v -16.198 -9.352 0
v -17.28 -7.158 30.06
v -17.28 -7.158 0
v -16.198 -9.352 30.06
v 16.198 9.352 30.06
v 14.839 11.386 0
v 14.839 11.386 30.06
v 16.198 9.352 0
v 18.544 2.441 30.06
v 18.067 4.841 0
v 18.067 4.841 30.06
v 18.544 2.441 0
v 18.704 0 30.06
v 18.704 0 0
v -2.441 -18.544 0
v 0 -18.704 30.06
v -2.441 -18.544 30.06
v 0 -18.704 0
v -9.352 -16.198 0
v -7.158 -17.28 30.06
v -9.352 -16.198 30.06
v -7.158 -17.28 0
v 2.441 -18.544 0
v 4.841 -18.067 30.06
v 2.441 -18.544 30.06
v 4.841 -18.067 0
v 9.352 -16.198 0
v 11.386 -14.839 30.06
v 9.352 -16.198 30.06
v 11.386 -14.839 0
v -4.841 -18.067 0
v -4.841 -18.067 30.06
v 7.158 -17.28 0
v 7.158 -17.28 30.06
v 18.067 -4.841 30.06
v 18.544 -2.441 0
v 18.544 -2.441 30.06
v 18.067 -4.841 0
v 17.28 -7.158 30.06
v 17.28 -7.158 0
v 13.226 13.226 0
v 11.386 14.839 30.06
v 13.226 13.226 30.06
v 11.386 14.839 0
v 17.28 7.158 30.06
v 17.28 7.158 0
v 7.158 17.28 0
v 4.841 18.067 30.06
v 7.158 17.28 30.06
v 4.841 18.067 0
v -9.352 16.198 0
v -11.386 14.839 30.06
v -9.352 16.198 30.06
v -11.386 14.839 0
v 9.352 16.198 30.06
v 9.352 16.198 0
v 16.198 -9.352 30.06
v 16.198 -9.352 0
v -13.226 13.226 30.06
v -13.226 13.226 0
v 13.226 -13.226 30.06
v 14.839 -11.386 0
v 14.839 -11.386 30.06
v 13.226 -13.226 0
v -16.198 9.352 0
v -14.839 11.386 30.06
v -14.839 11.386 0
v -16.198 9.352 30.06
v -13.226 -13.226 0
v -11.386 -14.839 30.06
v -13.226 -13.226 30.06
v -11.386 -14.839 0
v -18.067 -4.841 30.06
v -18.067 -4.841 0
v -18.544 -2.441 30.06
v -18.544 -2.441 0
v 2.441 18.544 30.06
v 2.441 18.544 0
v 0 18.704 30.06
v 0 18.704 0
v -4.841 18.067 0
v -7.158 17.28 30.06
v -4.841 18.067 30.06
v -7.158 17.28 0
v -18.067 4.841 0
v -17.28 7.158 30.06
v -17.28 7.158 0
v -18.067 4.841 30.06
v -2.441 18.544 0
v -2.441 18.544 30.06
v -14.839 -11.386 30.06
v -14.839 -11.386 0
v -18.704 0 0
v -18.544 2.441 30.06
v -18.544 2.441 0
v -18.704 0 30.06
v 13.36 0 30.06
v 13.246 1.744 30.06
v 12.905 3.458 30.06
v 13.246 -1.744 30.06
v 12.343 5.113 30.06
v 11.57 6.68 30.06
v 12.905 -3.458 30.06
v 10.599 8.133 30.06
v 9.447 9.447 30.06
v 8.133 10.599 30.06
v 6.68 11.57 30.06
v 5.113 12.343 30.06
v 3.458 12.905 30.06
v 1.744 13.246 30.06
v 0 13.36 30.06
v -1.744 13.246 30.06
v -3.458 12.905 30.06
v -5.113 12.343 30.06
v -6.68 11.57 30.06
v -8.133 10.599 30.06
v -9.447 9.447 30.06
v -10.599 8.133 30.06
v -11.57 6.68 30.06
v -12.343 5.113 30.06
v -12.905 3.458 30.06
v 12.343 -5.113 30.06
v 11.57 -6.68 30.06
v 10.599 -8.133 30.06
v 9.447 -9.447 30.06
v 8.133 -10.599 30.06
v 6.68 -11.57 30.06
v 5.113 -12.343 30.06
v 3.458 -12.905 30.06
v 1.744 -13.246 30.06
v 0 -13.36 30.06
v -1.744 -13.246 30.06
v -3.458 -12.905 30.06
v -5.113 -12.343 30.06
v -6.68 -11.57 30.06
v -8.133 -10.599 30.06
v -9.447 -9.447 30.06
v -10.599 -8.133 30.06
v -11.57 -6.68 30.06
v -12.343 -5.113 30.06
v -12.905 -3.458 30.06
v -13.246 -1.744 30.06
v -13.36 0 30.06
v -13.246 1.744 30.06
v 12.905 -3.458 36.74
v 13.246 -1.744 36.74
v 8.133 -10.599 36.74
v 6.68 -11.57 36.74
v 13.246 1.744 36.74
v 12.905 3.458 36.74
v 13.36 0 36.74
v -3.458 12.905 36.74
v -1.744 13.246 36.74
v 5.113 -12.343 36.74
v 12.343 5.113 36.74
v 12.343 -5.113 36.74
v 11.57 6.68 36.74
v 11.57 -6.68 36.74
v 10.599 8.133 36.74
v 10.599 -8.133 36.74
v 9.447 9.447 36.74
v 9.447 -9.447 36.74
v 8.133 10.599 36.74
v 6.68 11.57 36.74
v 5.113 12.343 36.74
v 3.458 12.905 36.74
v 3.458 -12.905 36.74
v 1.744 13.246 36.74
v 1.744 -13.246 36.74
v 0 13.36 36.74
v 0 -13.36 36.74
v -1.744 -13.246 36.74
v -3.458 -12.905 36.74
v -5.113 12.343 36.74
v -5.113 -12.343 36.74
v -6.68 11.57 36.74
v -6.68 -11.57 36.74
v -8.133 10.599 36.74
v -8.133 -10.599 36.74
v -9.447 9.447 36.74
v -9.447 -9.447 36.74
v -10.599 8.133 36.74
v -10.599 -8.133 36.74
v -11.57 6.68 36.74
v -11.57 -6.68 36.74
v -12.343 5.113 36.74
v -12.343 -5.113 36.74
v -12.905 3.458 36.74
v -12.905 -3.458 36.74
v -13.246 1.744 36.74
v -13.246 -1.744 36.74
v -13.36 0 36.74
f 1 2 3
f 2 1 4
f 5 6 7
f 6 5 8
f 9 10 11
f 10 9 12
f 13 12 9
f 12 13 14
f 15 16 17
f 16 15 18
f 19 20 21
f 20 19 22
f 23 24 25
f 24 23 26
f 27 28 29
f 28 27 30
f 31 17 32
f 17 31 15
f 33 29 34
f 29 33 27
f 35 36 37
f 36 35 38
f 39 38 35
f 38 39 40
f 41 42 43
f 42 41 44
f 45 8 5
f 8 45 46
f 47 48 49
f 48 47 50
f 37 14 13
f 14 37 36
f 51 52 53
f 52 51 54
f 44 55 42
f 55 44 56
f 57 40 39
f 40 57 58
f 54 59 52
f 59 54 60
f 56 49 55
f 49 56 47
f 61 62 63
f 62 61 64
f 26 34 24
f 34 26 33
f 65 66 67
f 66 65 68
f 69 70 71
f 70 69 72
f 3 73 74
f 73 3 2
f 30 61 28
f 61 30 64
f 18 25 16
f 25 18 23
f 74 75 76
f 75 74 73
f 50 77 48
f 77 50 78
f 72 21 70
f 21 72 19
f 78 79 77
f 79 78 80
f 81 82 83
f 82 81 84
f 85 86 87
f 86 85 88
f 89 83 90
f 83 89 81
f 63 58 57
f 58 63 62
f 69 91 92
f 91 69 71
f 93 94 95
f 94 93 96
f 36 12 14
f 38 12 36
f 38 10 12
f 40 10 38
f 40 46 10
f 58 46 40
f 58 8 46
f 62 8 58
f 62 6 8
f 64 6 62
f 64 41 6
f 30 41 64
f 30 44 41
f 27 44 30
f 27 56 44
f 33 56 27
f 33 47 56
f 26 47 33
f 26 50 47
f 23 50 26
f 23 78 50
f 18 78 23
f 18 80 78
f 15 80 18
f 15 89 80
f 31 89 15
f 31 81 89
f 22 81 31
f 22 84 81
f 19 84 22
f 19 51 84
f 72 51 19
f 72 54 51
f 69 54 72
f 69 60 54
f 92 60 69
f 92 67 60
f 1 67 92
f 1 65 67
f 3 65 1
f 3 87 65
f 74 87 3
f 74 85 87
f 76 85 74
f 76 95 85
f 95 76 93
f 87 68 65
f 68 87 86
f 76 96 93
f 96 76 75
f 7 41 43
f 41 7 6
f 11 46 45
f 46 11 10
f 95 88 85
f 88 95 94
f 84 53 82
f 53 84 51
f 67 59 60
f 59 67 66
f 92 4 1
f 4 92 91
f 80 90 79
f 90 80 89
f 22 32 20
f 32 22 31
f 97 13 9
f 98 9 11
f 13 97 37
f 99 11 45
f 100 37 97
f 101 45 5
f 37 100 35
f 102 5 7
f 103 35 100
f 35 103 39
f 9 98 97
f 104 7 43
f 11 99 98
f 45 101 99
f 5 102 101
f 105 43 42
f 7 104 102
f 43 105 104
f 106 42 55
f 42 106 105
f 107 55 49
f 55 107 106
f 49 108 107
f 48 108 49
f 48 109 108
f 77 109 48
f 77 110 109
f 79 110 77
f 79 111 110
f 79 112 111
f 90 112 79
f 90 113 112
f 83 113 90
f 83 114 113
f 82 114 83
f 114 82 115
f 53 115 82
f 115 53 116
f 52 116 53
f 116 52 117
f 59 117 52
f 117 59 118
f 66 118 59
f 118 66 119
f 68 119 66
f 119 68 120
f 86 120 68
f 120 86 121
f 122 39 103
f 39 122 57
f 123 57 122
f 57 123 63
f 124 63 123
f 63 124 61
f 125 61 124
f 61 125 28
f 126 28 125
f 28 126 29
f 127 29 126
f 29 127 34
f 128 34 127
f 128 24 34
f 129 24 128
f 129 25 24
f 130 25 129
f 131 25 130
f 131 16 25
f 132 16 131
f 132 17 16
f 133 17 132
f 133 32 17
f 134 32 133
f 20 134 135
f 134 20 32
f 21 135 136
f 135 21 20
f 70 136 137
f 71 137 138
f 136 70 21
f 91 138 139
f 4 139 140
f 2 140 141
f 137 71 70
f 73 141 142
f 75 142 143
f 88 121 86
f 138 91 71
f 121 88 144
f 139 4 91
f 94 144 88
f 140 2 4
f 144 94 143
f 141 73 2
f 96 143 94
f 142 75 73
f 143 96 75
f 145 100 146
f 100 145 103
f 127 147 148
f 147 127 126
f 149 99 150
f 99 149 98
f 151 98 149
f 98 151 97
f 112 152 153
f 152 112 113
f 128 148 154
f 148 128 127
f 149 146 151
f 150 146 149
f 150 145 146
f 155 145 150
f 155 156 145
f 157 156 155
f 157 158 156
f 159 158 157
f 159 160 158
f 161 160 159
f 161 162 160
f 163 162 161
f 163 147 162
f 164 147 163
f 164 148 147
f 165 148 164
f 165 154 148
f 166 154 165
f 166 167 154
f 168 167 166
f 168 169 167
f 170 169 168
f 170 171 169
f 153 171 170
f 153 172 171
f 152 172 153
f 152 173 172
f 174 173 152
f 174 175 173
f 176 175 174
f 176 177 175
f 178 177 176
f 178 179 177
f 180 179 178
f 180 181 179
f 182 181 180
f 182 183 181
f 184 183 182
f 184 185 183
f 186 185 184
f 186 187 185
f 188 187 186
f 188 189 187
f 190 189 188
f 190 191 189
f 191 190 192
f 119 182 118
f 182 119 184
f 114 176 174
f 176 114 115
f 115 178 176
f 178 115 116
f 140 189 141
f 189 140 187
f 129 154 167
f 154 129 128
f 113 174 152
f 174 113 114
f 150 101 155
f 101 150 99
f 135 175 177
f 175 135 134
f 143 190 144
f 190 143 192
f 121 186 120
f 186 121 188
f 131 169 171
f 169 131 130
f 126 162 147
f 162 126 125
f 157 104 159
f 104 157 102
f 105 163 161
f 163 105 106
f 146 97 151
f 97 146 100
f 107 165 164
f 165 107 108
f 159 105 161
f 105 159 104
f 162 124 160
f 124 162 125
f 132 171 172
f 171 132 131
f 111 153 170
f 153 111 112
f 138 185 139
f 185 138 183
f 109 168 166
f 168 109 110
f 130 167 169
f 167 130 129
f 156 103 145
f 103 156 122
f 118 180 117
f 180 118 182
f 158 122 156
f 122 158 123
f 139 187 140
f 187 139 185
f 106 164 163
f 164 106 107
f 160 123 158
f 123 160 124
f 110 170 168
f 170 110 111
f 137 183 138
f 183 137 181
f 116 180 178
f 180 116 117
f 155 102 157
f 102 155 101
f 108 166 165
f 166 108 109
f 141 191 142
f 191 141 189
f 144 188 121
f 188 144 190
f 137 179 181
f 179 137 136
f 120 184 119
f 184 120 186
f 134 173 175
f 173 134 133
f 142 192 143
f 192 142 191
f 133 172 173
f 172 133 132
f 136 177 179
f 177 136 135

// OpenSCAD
// Auto-generated by scripts/author_from_manifest.py (Phase D.3).
// Source: data/phase_d_manifest.json (sku_intent='anvil-cap-threaded-1in').
// Do not hand-edit — regenerate from the manifest.
//
// @part anvil_cap_threaded_1in
// @kind fitting
// @category fitting.cap
// @display-name "Anvil FIG 1 Threaded Cap 1\""
// @mfg anvil_international
// @mfg-pn FIG_1_1in
// @listing UL FM
// @price-usd 8.50
// @install-minutes 6
// @crew journeyman
// @param size_in number default=1 label="Size" unit="in"
// @port inlet position=[-0.05,0,0] direction=[-1,0,0] style=grooved size_in=1 role=run_a
// @port outlet position=[0.05,0,0] direction=[1,0,0] style=grooved size_in=1 role=run_b

size_in = 1.0;

function od_mm(nps) =
    nps ==   1  ? 33.4 :
    nps == 1.25 ? 42.2 :
    nps == 1.5  ? 48.3 :
    nps ==   2  ? 60.3 :
    nps == 2.5  ? 73.0 :
    nps ==   3  ? 88.9 :
    nps ==   4  ? 114.3 :
    nps ==   5  ? 141.3 :
    nps ==   6  ? 168.3 : 60.3;

od = od_mm(size_in);
h  = od * 0.9;

union() {
    cylinder(h = h, d = od * 1.12, $fn = 48);
    translate([0, 0, h])
        cylinder(h = od * 0.2, d = od * 0.8, $fn = 48);
}
